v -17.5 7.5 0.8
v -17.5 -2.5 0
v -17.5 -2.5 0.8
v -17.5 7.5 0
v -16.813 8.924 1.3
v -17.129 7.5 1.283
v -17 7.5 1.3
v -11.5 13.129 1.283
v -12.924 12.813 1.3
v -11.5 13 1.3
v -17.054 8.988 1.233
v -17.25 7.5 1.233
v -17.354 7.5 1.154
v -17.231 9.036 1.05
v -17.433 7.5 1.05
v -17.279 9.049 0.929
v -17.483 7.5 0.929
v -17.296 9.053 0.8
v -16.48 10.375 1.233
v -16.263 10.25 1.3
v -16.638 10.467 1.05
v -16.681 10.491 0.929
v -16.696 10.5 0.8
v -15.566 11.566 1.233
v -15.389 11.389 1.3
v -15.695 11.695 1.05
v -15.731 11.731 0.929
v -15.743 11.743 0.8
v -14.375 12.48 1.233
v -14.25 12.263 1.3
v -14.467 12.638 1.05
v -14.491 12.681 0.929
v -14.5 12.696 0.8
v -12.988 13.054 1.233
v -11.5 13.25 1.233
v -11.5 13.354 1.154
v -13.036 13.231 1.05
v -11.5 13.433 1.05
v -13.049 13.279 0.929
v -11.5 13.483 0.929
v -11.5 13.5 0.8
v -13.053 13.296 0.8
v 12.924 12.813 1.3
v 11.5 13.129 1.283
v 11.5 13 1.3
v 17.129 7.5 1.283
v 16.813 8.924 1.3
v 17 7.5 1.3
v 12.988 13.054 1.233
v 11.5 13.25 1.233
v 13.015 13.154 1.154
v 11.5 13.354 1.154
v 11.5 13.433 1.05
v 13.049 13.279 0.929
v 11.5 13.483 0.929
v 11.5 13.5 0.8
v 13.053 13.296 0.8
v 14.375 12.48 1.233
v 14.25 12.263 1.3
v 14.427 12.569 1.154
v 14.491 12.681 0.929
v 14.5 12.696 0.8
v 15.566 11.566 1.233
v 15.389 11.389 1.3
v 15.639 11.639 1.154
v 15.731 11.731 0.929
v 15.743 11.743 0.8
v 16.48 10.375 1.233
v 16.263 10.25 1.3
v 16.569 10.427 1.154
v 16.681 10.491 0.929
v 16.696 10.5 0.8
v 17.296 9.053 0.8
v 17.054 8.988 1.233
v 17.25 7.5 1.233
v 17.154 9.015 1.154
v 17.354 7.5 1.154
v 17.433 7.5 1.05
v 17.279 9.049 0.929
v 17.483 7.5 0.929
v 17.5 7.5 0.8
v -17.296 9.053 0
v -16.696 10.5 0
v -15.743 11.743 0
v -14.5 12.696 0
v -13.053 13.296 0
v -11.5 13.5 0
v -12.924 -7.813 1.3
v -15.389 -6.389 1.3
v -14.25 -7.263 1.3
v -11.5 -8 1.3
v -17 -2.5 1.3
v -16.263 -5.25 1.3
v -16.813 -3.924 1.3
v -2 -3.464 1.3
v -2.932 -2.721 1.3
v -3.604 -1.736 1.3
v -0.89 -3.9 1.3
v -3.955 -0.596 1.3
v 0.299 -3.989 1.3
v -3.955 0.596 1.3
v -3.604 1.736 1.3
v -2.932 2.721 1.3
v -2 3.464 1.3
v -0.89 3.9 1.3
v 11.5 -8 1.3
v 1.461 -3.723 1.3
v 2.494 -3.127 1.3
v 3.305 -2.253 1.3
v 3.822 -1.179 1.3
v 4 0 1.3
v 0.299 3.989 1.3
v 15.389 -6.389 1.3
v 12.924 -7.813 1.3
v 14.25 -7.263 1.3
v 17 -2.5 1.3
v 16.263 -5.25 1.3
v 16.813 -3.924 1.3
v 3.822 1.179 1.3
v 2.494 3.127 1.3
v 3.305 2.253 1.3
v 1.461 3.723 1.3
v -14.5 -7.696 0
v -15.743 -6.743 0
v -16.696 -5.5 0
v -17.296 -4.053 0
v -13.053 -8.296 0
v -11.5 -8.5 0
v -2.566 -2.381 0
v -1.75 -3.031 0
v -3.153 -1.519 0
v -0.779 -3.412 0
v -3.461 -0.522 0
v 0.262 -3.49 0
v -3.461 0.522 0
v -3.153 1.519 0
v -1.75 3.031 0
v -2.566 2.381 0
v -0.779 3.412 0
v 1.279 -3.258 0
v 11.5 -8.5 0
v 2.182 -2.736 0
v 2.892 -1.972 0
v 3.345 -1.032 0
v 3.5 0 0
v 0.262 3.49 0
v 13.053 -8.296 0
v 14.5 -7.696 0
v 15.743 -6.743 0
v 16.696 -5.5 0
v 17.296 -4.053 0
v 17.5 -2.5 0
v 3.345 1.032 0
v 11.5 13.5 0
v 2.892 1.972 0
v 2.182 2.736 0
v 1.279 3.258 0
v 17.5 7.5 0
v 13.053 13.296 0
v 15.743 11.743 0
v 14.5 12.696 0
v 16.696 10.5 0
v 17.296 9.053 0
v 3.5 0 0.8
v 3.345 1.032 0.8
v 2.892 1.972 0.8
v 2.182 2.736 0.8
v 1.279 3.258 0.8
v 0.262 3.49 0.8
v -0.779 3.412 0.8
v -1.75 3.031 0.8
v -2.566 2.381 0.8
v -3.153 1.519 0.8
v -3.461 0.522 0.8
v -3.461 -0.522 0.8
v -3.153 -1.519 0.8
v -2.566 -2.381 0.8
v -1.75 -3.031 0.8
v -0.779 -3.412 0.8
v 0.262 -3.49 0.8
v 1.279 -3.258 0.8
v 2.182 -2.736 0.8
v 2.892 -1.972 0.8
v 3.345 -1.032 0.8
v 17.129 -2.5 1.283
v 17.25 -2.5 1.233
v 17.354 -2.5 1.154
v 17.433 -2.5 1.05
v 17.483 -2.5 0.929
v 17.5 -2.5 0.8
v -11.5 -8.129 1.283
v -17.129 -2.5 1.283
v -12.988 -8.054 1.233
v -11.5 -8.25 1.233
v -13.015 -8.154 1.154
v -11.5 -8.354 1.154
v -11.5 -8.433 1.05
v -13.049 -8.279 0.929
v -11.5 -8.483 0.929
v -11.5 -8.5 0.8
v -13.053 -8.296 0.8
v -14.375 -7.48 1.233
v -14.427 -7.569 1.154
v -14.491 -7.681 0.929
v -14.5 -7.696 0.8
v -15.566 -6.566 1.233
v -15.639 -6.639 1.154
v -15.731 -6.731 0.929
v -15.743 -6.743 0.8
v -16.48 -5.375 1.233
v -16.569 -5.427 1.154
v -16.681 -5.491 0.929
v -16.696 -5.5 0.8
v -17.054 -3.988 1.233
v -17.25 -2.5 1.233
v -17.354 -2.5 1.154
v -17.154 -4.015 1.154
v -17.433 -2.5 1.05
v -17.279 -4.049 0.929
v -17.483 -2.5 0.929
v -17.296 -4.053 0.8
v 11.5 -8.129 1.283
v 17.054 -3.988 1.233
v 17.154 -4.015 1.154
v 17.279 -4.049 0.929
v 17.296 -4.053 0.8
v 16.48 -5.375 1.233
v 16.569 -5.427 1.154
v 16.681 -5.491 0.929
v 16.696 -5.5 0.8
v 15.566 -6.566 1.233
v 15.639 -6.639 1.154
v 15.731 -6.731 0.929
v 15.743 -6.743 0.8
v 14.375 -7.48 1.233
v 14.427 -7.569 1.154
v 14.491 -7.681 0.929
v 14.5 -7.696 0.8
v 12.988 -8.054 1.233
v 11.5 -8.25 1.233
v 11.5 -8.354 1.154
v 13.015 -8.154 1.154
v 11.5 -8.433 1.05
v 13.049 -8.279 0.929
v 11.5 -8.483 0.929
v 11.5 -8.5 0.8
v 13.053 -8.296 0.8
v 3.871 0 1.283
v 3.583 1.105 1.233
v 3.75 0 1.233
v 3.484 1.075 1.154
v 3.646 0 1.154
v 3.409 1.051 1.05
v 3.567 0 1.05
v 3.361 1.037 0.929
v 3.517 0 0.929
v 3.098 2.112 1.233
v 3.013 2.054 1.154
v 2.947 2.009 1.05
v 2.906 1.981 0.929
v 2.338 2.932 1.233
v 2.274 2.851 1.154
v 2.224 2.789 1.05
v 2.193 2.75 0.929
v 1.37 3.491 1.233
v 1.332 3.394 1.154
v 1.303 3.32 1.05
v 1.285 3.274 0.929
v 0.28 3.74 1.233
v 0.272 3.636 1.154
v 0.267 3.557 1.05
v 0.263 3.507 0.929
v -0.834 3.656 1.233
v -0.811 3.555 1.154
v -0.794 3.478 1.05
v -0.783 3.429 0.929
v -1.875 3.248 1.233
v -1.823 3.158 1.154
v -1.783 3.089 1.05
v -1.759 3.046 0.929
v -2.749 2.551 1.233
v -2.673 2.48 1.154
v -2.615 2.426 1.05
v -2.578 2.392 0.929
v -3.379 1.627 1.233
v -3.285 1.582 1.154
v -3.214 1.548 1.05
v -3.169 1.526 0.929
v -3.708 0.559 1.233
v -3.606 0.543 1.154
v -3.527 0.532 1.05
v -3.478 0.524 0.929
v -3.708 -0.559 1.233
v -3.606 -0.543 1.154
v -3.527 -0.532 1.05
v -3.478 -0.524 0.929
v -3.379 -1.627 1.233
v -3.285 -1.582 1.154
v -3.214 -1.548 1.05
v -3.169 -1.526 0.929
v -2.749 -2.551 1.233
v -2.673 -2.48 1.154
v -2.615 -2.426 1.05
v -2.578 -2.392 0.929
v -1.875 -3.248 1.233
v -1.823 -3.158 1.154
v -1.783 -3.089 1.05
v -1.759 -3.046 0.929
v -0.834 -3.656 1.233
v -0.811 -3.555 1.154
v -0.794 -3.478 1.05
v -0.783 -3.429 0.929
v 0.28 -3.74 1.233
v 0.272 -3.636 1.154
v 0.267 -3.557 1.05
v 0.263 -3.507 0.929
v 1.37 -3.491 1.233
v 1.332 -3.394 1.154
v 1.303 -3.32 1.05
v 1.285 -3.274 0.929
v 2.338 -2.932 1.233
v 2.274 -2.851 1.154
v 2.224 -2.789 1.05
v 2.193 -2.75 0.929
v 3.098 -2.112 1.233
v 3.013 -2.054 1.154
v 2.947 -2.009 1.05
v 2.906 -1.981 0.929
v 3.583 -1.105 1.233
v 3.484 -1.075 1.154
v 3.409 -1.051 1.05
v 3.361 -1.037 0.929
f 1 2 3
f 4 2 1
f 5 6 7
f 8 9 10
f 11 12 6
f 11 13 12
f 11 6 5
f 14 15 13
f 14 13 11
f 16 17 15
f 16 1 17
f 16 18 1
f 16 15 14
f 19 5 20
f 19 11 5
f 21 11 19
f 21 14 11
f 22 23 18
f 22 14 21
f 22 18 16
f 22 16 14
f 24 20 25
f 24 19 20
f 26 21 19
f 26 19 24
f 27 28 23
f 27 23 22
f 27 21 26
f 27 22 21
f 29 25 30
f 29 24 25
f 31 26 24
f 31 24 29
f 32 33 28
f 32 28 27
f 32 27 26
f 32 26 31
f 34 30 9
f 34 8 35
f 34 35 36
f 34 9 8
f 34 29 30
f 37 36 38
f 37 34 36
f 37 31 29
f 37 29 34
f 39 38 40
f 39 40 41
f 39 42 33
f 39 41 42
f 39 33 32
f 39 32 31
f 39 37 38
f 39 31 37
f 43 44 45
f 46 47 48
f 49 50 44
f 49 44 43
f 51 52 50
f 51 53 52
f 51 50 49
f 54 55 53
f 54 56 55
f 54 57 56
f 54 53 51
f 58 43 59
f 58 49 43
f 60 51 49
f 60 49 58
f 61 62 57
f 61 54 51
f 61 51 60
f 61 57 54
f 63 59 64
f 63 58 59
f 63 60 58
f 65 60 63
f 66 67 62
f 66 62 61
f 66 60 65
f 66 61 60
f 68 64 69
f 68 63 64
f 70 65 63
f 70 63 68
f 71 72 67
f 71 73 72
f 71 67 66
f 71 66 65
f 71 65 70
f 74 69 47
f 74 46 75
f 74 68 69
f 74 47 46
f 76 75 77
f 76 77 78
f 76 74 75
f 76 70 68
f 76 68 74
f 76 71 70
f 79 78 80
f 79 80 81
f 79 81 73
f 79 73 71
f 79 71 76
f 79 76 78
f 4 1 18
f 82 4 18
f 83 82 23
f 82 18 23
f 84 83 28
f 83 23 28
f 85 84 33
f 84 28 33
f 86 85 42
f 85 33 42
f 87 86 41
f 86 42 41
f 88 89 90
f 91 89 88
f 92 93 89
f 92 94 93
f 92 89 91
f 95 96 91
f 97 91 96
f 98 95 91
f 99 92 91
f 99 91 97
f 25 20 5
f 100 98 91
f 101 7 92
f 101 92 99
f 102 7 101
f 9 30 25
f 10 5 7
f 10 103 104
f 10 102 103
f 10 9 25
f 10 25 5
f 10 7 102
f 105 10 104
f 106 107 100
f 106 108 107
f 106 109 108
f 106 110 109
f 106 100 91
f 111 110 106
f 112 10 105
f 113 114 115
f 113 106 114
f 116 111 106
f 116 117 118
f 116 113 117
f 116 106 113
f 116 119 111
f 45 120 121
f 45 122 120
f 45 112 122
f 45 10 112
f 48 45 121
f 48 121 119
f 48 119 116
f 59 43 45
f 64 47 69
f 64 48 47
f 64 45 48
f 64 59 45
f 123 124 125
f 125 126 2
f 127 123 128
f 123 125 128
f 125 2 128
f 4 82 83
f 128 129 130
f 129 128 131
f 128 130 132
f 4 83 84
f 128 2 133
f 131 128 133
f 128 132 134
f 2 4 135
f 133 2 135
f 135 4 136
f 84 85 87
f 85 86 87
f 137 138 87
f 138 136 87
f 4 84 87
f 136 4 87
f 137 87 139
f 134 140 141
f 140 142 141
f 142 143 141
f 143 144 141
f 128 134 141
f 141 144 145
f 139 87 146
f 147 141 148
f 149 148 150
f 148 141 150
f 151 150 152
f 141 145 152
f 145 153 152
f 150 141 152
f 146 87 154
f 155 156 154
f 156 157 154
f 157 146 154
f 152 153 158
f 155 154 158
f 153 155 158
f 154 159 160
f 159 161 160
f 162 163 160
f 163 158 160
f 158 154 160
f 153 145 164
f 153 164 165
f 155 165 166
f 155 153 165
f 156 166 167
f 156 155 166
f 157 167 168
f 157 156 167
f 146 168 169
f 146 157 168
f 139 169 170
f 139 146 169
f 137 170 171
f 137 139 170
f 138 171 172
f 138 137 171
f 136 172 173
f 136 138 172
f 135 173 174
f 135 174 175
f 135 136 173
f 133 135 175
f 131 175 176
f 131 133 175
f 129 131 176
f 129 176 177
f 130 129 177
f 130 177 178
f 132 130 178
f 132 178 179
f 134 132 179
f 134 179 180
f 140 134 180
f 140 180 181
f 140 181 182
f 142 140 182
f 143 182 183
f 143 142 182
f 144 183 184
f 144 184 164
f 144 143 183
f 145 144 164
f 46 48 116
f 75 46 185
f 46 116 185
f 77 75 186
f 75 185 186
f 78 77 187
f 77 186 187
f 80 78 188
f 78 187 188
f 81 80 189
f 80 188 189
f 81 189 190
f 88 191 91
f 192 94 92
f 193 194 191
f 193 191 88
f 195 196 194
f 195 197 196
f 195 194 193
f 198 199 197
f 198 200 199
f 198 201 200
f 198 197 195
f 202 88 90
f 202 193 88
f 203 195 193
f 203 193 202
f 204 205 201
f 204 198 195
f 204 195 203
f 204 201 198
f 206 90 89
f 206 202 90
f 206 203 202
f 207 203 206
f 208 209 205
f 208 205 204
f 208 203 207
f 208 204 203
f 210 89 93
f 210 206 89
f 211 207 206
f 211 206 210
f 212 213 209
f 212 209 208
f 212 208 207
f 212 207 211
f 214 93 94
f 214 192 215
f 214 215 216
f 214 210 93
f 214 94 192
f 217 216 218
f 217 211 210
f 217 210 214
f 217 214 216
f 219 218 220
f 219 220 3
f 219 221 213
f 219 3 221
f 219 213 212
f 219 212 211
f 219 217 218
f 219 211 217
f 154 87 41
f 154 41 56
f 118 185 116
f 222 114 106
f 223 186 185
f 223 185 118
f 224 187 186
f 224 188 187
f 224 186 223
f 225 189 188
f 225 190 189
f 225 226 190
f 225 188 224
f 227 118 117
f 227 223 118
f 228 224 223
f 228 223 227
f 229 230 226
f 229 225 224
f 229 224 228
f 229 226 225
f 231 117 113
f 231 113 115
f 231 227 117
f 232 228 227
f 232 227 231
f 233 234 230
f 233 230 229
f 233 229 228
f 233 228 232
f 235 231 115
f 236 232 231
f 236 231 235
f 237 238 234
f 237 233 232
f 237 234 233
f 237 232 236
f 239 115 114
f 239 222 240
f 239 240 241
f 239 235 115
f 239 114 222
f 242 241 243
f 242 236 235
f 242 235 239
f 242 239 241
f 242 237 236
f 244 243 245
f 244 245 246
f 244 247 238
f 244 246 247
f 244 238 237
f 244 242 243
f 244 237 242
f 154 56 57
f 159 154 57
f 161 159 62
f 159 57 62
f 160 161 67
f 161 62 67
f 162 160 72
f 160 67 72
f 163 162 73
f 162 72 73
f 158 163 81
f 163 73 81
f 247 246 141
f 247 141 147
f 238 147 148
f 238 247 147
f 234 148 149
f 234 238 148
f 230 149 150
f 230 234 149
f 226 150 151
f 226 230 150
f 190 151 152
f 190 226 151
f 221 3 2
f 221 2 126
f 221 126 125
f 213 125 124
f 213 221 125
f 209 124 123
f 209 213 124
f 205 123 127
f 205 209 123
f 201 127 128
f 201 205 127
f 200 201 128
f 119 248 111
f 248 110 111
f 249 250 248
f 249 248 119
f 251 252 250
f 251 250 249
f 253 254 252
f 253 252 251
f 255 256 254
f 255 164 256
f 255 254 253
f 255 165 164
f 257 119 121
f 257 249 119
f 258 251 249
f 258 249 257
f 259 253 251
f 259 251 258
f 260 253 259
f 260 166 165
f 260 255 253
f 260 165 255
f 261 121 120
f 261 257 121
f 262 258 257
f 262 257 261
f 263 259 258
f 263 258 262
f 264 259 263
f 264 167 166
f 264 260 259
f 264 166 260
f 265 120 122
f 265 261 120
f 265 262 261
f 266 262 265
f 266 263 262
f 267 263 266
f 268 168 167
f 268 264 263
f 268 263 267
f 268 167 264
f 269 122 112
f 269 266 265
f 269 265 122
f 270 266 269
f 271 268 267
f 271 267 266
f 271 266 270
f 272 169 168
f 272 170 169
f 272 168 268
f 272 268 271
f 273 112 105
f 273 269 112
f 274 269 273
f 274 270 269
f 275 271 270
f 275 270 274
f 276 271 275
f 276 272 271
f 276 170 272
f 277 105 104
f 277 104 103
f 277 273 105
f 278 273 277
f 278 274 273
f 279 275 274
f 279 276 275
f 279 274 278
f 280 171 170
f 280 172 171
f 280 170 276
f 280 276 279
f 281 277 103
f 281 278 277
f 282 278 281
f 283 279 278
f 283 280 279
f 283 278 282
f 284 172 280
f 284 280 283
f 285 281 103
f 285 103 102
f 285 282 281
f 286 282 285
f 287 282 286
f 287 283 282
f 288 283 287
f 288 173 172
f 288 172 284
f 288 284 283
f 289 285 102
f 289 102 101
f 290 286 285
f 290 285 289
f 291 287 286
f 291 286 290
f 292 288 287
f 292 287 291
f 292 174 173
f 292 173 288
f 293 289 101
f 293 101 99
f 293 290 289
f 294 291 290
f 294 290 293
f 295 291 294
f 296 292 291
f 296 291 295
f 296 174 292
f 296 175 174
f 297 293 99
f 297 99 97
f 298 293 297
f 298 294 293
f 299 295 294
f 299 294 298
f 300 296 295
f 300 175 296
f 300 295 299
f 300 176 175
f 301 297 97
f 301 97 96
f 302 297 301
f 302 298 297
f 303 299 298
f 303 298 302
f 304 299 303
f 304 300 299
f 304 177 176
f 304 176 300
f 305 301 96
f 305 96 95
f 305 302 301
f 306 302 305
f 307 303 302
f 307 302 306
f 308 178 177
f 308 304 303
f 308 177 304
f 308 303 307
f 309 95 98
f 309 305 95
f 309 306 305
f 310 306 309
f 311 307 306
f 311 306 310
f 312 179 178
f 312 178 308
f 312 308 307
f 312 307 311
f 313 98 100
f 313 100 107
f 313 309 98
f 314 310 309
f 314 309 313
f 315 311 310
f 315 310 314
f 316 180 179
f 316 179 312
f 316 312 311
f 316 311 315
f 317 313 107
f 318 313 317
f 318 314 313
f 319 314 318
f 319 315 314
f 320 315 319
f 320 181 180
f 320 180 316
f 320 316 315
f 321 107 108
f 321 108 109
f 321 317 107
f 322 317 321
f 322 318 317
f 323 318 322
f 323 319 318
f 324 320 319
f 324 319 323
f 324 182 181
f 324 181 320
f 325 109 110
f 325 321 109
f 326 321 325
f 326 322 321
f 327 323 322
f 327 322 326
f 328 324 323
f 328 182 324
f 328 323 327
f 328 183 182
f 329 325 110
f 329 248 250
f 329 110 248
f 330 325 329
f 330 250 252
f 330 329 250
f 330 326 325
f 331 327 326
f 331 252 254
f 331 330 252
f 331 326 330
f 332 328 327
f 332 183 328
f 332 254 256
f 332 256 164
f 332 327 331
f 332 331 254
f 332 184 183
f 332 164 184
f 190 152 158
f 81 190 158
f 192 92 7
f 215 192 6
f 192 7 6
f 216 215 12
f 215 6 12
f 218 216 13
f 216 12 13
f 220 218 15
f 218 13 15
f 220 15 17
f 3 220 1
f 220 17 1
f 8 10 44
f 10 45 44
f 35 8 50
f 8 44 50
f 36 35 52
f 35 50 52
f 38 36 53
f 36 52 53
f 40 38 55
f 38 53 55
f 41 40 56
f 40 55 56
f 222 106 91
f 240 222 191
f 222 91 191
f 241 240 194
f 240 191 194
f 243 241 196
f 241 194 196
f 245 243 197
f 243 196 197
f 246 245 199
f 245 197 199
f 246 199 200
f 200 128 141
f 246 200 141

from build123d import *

# Parameters (mm, degrees)
F0_W     = 35
F0_H     = 22
F0_R     = 3.5
F1_DEPTH = 1.3
F2_R     = 6
F3_R     = 0.5


with BuildPart() as f1:
    # F0 (on Top) → F1 (new body)
    with BuildSketch(Plane.XY):
        with Locations((0, 2.5)):
            Rectangle(F0_W, F0_H)
        Circle(F0_R, mode=Mode.SUBTRACT)
    extrude(amount=F1_DEPTH)

    # F2
    f2_edges = [f1.edges().sort_by_distance(p)[0] for p in [
        (17.5, 13.5, 0.65),
        (-17.5, 13.5, 0.65),
        (-17.5, -8.5, 0.65),
        (17.5, -8.5, 0.65),
    ]]
    fillet(f2_edges, radius=F2_R)

    # F3
    f3_edges = [f1.edges().sort_by_distance(p)[0] for p in [
        (0, 13.5, 1.3),
        (15.742641, 11.742641, 1.3),
        (-15.742641, 11.742641, 1.3),
        (17.5, 2.5, 1.3),
        (-17.5, 2.5, 1.3),
        (15.742641, -6.742641, 1.3),
        (-15.742641, -6.742641, 1.3),
        (0, -8.5, 1.3),
        (-3.5, 0, 1.3),
    ]]
    fillet(f3_edges, radius=F3_R)


solid = f1.part
